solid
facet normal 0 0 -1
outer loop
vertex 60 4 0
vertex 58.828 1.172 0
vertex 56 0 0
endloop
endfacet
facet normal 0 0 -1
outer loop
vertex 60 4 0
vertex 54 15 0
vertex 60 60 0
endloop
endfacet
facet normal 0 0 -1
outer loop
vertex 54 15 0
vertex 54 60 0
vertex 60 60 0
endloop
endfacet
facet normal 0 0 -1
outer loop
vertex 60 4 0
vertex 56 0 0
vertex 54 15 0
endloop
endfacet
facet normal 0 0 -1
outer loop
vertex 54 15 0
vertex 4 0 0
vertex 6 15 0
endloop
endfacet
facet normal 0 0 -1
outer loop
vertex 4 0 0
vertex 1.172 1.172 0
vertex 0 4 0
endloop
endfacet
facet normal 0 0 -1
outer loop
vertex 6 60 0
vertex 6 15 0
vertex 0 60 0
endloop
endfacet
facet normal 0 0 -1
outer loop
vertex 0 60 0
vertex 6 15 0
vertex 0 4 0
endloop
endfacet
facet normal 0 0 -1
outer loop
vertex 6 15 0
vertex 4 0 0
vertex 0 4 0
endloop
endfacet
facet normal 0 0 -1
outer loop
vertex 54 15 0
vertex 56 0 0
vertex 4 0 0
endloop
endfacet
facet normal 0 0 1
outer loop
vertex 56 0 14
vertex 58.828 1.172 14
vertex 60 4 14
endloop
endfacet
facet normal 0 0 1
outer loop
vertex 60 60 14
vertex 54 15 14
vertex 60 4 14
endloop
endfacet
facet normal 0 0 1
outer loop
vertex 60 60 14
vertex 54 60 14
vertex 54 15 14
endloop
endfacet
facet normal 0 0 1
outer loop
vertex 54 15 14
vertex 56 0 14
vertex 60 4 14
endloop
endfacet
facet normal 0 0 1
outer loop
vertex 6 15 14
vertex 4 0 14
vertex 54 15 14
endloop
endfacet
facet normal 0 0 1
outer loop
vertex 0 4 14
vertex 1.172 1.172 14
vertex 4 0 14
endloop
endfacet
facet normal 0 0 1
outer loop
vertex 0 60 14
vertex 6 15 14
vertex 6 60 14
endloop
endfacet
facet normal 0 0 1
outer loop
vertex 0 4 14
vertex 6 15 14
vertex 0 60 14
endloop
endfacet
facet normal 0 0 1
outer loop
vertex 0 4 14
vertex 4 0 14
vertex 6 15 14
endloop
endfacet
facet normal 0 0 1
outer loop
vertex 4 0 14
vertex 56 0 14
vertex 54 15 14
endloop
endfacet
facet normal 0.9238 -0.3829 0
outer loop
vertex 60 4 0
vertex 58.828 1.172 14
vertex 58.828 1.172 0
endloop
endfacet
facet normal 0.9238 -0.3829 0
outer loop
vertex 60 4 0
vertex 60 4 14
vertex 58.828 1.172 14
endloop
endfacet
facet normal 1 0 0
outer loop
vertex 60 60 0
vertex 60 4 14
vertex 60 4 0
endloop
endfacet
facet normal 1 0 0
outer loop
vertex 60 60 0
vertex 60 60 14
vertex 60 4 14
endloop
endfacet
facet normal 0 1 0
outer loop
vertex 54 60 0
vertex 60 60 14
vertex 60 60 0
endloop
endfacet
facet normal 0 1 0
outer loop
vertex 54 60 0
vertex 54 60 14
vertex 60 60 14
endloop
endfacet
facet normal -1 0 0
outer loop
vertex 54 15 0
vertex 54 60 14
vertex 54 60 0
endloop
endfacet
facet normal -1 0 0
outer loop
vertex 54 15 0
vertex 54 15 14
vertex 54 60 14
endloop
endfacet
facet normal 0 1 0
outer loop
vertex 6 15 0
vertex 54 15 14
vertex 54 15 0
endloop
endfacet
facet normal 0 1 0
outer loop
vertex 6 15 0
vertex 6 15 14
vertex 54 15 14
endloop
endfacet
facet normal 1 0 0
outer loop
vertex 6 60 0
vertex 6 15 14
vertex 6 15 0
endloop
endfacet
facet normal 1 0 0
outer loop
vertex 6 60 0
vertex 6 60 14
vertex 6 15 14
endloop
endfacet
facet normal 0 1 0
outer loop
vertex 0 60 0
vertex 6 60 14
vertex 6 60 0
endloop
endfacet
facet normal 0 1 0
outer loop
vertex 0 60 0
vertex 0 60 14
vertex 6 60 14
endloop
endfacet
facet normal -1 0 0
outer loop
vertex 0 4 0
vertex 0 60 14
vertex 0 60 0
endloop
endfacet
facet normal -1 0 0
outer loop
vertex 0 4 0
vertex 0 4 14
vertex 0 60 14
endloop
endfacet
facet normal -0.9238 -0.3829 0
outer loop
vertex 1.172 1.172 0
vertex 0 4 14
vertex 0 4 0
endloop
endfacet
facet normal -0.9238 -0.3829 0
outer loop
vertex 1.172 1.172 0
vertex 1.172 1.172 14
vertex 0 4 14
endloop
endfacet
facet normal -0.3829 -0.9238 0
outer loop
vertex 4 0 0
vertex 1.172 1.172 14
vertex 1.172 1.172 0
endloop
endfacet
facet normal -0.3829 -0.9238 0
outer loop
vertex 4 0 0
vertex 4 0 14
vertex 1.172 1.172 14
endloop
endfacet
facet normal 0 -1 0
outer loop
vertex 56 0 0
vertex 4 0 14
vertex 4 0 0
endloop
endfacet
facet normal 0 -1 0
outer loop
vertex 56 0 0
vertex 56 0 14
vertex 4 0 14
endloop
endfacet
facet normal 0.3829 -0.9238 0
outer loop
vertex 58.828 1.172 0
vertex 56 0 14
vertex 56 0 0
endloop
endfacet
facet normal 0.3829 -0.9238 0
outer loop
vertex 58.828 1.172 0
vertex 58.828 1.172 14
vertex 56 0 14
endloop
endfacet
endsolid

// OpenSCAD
$fn = 32;

// ----------------------------------------------------------------------
// Heat sink frame: 60 x 60 mm frame, 6 mm walls
// ----------------------------------------------------------------------

// --- parameters (mm) ---
profile_height = 14;      // extrusion height
profile_points = 12;      // points of the closed outline

profile = [[0, 4], [1.172, 1.172], [4, 0], [56, 0], [58.828, 1.172], [60, 4], [60, 60], [54, 60], [54, 15], [6, 15], [6, 60], [0, 60]];  // single closed polygon, 12 points, counter clockwise

// --- the one profile operation ---
linear_extrude(height = profile_height) polygon(points = profile);
